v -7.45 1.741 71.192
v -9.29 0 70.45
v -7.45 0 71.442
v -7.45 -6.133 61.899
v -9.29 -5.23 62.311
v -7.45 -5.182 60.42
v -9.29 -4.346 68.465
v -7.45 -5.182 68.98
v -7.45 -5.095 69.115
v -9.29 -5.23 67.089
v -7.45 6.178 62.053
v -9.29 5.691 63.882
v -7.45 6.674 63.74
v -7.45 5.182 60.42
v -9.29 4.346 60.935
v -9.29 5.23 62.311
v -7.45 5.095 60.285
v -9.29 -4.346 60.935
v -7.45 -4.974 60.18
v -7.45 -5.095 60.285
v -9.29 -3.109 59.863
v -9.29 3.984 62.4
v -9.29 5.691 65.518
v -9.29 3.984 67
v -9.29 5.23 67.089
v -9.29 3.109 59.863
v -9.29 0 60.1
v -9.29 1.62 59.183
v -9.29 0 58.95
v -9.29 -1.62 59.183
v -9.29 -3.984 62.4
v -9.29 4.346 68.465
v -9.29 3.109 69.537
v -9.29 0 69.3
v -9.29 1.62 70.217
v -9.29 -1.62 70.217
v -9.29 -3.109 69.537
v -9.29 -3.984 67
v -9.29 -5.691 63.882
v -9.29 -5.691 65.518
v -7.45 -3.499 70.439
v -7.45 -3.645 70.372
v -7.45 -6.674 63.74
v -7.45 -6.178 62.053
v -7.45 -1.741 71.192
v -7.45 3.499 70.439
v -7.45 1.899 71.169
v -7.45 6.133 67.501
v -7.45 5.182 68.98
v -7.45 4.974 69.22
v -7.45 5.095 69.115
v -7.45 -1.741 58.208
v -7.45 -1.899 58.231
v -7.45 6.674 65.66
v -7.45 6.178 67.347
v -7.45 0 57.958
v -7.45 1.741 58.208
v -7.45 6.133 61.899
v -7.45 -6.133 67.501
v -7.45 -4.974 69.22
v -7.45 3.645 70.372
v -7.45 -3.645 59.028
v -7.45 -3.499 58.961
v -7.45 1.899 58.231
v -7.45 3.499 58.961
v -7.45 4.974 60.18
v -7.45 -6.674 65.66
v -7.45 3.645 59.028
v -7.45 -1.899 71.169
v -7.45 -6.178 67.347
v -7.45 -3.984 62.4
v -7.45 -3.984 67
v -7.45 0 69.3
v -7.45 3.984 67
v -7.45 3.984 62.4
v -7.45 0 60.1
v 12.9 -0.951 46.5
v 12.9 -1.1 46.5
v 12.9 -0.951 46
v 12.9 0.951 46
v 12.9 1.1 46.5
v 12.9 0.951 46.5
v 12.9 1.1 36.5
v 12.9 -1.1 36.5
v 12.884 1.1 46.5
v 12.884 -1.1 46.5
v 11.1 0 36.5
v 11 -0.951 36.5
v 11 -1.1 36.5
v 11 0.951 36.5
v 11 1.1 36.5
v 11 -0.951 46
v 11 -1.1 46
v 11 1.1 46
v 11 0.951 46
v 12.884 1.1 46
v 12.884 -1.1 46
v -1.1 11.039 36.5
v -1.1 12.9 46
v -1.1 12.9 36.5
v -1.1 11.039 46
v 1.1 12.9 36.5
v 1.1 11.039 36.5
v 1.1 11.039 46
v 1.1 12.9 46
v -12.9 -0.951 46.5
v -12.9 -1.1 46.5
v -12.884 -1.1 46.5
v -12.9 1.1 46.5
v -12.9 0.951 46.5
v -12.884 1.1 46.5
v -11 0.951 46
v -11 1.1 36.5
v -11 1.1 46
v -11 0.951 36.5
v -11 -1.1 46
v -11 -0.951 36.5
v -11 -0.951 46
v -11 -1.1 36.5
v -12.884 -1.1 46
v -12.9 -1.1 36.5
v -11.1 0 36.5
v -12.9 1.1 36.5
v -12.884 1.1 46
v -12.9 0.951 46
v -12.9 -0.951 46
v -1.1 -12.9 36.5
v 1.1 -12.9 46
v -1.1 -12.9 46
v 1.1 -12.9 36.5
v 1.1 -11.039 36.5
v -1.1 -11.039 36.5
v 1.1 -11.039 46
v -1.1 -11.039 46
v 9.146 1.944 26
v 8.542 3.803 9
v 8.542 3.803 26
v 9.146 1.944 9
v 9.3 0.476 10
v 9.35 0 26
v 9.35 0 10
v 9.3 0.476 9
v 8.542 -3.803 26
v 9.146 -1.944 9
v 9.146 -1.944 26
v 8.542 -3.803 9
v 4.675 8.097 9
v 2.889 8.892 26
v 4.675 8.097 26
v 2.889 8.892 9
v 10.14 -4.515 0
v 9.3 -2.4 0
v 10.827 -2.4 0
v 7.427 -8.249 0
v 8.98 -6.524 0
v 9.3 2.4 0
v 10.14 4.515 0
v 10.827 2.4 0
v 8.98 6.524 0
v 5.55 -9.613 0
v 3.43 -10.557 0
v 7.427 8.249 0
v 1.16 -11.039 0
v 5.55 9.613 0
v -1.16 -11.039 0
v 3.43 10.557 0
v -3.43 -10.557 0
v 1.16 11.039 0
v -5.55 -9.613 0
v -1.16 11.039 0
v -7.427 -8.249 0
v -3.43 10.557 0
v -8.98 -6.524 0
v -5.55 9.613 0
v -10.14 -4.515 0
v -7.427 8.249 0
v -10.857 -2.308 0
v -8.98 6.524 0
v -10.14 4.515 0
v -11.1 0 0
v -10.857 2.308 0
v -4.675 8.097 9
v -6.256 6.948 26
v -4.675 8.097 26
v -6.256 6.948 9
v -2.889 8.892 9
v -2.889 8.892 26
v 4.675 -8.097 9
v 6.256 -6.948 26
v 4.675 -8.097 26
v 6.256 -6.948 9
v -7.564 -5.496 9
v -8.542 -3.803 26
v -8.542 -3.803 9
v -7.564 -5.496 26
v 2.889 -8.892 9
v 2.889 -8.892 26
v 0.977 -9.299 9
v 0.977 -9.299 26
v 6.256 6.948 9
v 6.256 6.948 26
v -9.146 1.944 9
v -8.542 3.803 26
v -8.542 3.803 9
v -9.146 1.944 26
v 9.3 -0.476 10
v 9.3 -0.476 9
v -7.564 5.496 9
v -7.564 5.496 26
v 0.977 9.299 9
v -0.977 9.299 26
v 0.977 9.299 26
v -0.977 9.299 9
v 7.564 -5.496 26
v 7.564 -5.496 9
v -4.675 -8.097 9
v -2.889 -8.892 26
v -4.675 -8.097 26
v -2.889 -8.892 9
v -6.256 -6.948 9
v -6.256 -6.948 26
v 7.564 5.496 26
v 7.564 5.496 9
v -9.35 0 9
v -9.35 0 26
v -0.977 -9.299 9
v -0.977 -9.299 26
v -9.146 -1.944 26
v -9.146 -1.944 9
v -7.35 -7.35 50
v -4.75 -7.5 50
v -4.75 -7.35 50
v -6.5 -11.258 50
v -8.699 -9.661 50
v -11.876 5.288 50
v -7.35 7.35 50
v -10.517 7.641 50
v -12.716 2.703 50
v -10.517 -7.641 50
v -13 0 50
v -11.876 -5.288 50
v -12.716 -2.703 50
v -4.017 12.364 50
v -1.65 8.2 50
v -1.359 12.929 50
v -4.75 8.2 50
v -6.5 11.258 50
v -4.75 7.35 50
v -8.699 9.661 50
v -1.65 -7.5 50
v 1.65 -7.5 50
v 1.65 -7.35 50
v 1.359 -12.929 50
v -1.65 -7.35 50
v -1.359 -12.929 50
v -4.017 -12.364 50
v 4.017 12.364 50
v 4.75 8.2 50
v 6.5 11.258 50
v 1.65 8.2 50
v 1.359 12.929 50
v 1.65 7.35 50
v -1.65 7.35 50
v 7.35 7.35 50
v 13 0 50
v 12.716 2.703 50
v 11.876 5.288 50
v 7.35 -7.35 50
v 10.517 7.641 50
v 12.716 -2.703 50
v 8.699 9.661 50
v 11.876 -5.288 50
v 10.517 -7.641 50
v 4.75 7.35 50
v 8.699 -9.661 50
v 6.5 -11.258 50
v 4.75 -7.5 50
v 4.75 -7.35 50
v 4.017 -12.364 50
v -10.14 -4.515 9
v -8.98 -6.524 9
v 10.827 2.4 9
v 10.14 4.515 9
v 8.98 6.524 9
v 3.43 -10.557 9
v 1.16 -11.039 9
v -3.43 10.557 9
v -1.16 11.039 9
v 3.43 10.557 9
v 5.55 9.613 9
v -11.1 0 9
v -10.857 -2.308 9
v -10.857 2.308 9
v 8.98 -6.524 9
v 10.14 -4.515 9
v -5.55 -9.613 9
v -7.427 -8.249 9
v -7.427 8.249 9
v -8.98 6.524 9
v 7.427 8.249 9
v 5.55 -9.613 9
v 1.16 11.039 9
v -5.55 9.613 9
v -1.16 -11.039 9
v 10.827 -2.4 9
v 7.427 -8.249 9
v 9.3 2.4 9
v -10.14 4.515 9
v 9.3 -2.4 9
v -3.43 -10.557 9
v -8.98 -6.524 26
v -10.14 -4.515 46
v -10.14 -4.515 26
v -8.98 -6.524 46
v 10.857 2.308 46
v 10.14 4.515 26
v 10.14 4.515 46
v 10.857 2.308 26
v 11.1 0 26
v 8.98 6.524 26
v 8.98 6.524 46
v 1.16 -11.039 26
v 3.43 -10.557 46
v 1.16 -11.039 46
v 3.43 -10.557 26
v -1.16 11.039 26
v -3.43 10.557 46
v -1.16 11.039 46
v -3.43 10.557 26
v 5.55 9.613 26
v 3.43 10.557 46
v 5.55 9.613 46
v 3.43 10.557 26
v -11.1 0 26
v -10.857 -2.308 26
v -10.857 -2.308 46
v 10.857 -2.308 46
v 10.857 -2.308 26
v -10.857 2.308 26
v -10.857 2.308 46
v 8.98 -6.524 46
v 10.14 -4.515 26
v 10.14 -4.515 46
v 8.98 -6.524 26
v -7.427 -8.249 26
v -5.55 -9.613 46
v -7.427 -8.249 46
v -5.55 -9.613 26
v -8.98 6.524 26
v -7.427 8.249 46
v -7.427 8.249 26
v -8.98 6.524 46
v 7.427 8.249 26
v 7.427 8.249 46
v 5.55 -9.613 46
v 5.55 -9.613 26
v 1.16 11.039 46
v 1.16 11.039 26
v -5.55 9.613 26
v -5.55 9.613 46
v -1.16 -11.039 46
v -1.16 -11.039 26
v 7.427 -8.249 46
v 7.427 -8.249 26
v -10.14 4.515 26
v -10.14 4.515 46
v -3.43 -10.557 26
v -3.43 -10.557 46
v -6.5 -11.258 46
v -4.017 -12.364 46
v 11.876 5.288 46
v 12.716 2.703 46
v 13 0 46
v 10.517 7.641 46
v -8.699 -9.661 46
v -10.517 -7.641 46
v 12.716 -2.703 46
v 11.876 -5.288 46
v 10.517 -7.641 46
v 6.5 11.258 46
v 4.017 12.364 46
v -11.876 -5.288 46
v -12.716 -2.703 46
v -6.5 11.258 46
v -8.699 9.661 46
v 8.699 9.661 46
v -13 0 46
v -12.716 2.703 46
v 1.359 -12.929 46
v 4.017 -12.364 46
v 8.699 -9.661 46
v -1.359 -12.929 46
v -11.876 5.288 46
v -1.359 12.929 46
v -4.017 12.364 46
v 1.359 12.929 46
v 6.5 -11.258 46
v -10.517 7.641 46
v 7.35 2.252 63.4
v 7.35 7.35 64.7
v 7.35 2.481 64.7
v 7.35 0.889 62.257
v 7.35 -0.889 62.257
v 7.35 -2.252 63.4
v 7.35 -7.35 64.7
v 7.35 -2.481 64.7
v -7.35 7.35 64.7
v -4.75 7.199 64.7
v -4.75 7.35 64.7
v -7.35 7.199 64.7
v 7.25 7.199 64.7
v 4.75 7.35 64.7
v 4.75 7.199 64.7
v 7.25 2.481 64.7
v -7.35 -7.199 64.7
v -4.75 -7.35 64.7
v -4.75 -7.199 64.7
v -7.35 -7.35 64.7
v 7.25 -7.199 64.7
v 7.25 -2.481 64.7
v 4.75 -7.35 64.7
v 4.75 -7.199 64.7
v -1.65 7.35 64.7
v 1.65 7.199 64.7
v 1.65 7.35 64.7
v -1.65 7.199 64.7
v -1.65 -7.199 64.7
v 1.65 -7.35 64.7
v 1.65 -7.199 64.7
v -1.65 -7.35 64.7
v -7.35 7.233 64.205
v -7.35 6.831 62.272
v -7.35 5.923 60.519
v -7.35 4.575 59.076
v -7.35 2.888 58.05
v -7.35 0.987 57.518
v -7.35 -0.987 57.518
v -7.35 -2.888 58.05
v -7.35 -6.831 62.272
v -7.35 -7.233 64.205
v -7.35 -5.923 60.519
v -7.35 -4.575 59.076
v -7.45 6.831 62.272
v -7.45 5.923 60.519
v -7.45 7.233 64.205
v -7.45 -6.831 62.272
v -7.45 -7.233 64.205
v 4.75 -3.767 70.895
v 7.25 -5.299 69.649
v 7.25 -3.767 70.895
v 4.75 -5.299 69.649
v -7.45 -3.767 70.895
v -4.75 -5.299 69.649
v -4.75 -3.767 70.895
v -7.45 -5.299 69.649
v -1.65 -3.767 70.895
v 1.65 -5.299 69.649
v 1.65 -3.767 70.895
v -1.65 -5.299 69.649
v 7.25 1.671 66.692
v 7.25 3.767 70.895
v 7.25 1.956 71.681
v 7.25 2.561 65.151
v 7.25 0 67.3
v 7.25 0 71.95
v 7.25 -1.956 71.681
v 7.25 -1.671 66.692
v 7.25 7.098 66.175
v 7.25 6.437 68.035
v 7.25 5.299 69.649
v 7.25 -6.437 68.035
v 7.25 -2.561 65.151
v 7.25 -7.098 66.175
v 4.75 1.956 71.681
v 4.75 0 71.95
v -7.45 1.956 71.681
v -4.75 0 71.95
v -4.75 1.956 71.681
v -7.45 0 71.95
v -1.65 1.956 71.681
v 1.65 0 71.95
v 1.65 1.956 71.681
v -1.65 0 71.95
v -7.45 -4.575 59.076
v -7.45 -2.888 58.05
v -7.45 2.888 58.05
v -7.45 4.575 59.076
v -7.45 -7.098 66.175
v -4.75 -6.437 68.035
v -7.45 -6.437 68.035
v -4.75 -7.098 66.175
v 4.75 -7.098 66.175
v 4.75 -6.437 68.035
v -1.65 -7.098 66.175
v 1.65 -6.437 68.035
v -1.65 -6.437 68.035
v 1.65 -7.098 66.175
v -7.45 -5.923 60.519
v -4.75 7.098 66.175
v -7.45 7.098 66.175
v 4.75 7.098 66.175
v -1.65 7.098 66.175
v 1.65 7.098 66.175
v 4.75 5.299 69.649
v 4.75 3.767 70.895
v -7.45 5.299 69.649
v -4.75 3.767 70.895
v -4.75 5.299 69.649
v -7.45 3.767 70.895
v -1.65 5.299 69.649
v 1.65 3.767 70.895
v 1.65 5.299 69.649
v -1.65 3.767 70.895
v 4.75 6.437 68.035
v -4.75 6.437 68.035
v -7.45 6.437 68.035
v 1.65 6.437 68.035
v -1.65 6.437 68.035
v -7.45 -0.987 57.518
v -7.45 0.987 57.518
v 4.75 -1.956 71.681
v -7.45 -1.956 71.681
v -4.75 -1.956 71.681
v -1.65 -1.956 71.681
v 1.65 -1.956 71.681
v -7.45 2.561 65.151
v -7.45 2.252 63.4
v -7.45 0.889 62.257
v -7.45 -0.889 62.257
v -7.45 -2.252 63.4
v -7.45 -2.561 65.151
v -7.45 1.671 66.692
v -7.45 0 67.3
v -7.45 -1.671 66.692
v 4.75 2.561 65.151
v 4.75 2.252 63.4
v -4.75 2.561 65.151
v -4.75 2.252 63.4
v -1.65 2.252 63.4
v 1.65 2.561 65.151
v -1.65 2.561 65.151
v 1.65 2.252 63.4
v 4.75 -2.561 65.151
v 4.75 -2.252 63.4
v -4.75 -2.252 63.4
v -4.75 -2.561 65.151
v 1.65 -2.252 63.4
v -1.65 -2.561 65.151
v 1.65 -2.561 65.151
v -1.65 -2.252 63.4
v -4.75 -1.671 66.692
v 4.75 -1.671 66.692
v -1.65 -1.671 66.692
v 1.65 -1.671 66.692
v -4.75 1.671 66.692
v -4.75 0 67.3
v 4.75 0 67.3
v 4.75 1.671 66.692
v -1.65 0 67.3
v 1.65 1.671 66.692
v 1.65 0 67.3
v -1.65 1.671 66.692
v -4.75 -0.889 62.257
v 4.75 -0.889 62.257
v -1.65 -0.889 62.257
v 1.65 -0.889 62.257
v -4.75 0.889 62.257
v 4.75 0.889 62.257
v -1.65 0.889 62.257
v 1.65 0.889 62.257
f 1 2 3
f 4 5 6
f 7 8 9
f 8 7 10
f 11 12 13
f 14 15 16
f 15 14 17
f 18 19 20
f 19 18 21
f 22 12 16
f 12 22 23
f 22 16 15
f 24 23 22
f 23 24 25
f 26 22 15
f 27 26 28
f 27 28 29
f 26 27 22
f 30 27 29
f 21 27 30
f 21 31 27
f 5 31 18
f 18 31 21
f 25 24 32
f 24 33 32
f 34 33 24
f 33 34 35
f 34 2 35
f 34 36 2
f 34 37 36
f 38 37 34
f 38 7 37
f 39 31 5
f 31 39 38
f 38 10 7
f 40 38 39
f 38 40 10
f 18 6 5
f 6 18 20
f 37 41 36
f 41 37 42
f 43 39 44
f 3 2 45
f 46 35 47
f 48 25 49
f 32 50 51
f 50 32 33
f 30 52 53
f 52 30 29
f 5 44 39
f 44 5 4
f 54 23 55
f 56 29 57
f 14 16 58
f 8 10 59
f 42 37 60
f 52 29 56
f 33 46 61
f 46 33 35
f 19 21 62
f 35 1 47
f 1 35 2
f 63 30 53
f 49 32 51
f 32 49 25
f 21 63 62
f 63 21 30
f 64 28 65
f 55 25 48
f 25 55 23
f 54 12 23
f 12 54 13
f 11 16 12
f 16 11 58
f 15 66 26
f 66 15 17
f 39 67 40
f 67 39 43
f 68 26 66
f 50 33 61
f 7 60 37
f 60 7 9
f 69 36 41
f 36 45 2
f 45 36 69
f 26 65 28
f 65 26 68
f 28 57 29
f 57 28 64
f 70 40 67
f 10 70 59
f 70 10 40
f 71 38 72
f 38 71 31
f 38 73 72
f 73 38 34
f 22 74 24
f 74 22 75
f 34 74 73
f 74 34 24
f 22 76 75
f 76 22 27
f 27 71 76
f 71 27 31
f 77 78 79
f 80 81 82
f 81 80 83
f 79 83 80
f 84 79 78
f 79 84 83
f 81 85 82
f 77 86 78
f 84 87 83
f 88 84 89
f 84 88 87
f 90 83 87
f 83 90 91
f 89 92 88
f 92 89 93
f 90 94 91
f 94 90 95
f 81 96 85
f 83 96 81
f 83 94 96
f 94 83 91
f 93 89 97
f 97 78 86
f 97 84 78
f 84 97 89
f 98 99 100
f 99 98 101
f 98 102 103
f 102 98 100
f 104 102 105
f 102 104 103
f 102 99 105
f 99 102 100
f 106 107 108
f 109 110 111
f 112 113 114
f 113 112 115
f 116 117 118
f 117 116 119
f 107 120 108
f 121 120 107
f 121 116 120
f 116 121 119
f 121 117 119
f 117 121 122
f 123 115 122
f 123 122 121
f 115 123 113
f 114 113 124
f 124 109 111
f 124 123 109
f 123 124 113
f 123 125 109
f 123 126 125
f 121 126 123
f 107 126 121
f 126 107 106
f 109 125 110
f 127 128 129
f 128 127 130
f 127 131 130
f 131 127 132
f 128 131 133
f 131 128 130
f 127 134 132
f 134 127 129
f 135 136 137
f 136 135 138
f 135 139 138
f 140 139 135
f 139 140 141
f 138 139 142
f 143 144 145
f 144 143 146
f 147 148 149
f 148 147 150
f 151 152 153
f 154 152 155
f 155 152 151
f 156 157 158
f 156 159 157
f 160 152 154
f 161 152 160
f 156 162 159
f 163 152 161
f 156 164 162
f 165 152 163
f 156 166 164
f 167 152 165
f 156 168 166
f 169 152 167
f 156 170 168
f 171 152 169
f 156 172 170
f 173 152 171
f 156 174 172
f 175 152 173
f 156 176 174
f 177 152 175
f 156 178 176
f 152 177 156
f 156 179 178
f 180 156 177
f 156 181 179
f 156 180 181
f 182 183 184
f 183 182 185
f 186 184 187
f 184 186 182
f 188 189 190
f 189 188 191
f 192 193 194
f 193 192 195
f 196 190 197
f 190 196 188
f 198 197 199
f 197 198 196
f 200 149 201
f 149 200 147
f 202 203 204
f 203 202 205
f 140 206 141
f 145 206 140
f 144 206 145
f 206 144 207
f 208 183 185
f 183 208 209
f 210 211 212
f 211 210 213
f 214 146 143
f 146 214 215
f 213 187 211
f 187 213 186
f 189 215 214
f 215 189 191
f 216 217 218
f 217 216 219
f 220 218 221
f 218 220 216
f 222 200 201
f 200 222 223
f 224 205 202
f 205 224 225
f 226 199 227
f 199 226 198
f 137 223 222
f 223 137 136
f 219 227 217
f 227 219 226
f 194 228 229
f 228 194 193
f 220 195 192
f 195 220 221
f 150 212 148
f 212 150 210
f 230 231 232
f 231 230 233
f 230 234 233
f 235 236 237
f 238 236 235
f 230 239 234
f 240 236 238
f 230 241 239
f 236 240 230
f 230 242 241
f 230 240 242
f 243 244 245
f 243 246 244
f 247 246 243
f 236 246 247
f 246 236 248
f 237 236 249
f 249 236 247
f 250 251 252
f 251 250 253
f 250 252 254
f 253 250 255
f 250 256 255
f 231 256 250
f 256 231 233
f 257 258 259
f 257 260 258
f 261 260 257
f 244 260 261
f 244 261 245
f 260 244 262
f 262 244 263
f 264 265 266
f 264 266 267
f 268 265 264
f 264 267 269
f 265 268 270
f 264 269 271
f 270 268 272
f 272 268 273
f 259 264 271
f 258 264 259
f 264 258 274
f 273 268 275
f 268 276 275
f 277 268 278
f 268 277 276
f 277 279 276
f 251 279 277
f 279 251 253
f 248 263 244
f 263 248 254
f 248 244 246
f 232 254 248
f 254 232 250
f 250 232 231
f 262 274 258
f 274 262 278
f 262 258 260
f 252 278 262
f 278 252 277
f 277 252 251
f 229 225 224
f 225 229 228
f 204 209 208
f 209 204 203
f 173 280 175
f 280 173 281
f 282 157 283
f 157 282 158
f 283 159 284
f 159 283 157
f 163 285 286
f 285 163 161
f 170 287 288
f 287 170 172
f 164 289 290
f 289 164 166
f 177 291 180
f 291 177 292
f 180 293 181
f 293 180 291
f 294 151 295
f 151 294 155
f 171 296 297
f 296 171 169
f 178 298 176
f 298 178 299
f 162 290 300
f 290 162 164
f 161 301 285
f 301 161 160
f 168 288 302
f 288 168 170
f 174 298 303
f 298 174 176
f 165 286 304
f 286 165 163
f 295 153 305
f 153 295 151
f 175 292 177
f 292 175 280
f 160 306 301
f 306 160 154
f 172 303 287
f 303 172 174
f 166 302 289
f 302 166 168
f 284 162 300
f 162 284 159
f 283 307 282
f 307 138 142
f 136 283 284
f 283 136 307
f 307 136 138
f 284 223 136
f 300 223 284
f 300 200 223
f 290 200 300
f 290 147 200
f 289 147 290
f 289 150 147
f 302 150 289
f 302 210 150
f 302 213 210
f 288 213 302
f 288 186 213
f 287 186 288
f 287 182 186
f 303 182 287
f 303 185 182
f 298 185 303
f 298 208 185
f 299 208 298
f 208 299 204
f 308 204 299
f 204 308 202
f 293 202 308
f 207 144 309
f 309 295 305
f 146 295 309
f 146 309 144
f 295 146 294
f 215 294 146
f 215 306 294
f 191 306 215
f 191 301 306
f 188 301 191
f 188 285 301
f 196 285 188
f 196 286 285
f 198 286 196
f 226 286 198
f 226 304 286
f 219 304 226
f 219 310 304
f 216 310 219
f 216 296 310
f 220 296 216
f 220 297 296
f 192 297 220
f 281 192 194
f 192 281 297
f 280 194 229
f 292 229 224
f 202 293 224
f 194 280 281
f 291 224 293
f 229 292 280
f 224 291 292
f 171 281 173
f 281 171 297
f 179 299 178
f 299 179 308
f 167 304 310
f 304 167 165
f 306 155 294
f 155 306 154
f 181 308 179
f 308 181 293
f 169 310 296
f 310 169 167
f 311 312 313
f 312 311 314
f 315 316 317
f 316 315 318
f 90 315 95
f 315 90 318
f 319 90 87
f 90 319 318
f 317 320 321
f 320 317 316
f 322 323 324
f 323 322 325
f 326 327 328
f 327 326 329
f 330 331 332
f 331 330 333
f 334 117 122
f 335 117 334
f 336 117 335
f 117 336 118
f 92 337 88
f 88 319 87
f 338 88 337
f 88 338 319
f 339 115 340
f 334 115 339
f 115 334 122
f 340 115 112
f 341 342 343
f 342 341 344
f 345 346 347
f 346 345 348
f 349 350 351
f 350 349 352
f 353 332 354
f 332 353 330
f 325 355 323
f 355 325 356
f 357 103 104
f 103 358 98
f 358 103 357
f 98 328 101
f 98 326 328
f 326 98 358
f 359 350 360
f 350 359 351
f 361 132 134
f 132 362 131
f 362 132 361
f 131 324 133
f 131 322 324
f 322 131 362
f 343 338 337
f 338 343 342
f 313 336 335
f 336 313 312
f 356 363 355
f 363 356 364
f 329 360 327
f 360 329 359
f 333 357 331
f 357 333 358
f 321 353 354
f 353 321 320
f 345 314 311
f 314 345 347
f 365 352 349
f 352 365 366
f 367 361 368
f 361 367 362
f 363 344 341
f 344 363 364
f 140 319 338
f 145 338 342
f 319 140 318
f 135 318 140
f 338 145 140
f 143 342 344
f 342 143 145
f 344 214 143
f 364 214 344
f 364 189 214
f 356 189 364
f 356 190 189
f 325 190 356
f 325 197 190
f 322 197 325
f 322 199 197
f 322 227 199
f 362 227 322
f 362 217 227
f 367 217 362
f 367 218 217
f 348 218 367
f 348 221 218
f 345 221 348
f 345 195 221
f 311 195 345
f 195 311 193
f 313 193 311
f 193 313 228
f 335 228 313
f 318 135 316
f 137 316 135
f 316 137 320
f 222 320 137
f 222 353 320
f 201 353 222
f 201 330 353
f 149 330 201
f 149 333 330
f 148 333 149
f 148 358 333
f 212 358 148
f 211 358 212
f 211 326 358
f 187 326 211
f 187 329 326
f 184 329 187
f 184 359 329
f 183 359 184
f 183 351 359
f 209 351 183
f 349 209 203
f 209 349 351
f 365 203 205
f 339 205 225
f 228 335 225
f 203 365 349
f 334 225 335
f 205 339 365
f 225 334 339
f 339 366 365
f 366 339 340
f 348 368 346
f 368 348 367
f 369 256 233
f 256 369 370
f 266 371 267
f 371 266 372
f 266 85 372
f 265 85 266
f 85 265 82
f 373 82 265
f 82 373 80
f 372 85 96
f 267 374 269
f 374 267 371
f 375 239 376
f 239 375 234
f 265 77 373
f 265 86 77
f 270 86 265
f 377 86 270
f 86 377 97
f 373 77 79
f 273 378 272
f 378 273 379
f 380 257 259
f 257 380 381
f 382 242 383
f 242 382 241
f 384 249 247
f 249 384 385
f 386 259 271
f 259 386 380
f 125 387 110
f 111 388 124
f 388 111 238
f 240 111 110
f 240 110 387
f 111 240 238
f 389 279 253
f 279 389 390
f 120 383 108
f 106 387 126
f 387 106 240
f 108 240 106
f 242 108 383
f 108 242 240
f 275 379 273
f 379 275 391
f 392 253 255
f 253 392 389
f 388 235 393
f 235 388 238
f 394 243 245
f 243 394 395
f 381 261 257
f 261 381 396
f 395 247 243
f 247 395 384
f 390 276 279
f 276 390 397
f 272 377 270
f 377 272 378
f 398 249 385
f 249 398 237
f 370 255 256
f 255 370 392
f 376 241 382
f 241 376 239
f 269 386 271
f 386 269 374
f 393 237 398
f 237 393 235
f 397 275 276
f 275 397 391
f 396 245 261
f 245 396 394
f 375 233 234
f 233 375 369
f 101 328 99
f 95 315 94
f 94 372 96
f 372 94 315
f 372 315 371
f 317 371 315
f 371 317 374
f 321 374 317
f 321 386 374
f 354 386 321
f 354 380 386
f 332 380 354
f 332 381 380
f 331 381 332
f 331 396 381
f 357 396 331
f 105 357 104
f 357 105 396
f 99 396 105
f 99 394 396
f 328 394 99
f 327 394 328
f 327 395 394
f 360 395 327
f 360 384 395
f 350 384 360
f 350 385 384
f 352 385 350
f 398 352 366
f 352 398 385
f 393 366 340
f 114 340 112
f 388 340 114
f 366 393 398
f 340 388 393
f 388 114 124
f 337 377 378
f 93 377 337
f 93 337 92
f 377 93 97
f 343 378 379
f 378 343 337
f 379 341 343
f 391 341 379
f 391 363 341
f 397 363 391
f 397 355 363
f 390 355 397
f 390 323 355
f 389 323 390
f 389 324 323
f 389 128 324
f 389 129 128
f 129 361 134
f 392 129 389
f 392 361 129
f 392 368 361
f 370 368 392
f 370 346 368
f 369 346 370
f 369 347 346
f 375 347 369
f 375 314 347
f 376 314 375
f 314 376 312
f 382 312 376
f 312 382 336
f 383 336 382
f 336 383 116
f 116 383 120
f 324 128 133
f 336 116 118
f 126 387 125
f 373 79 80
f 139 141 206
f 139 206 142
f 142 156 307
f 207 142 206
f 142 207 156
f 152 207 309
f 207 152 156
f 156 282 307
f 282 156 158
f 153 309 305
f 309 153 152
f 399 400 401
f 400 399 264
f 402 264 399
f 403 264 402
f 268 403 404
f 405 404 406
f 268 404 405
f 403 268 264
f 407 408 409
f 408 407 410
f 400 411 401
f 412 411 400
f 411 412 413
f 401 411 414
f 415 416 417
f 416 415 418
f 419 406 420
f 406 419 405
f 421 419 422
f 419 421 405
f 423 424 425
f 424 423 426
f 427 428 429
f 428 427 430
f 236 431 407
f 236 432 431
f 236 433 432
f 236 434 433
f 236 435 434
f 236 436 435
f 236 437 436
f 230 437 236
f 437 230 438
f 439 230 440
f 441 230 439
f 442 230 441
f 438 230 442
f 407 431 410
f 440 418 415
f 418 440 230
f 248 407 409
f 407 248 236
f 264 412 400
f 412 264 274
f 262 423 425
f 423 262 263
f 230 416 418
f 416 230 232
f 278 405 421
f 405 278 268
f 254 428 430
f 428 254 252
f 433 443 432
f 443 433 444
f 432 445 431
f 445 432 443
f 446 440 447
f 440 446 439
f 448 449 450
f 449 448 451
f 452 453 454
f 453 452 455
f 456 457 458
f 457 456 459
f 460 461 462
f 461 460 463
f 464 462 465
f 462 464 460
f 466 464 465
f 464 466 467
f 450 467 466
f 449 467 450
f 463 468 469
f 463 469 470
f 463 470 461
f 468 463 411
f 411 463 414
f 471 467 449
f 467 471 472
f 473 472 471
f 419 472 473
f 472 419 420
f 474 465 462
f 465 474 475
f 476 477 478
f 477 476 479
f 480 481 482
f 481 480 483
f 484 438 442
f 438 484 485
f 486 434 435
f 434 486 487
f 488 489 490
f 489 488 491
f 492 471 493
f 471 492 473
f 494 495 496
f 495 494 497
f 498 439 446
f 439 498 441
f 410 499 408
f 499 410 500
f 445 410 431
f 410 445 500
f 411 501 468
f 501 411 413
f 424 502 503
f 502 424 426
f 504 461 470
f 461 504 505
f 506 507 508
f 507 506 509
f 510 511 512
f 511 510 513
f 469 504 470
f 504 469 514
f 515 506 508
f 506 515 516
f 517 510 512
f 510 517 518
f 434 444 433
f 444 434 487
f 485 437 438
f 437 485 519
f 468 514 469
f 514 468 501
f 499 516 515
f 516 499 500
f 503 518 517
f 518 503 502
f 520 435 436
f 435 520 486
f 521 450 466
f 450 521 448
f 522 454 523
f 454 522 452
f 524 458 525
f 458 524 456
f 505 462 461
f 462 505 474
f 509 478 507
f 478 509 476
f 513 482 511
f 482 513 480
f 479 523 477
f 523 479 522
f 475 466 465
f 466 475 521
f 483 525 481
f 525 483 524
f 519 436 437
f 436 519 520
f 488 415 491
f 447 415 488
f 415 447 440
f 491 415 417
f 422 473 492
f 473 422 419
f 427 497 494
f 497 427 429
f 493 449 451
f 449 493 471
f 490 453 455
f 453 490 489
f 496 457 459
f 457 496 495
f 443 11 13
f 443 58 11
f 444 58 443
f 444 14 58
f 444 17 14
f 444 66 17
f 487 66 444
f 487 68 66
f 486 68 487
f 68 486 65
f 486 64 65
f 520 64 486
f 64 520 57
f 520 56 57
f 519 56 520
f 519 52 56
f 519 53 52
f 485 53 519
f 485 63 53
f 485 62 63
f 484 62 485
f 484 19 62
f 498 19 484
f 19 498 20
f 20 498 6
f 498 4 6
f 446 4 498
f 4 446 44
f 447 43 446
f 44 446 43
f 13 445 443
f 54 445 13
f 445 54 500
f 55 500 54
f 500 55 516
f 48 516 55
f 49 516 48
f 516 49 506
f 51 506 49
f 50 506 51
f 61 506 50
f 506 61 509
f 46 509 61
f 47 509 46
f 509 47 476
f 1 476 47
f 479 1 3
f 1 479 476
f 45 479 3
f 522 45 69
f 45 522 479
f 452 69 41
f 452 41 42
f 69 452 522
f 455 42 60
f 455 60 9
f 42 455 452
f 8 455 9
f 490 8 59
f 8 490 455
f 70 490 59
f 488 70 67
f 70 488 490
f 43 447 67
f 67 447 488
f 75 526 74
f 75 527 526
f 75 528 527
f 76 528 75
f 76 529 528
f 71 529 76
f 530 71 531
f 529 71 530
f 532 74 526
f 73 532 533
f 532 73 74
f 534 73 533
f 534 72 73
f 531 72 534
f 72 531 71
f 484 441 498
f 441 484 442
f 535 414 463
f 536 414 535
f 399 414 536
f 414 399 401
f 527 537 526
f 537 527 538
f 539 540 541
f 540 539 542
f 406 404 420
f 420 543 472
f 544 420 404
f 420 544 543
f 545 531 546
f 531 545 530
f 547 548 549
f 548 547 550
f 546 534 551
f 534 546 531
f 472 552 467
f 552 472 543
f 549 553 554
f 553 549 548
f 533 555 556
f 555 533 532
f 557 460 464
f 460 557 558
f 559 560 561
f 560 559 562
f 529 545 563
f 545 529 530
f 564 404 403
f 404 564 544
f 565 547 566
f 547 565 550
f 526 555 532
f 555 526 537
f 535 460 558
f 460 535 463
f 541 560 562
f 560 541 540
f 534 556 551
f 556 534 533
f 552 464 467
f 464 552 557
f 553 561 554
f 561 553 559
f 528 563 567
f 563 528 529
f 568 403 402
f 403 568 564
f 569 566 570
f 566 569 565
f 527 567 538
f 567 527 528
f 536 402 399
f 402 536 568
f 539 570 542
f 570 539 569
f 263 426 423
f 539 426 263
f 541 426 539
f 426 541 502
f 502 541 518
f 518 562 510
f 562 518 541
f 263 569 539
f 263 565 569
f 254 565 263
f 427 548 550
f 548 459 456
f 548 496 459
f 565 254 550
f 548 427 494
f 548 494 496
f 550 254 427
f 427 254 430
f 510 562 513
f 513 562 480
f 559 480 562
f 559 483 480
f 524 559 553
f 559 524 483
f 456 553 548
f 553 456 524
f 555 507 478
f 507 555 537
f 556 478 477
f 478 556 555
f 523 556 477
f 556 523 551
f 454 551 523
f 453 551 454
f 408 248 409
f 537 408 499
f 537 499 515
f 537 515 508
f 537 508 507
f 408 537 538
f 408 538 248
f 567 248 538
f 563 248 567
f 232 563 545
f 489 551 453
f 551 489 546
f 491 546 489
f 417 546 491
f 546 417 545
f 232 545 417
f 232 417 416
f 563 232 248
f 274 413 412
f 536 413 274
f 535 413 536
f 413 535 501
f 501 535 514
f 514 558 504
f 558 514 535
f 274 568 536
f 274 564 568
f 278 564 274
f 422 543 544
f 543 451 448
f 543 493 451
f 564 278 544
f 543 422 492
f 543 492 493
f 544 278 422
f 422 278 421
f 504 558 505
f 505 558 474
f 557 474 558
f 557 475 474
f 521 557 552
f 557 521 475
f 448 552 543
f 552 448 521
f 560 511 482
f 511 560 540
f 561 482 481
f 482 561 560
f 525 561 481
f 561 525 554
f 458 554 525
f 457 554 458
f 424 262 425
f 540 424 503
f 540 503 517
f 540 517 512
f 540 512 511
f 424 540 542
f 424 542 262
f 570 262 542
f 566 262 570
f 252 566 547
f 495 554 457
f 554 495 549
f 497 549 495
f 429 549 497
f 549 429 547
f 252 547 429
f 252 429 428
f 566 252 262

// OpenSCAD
/*
 * Go Pro mount for Cabela's ( Scotty's ) fishing pole holder
 * CCv3 SA BY 
 * by Angus Ainslie May 9 2017
 *
 * Much thanks goes to additional code work the following:
 *
 * GoPro variables from MoonCactus
*/


// Go Pro Parameters
/* [Rod and captive nut] */

gopro_rod_nut_od= 8.05;
// How much is the protruding output of the rod on the rod attachment (can be zero), useful if you don't want a captive nut with still a tight coupling
gopro_captive_protruding_h= 0.5;
// The gopro connector itself (you most probably do not want to change this but for the first two)

// The locking nut on the gopro mount triple arm mount (keep it tight)
gopro_nut_d= 9.2;
// How deep is this nut embossing (keep it small to avoid over-overhangs)
gopro_nut_h= 2;
// Hole diameter for the two-arm mount part
gopro_holed_two= 5;
// Hole diameter for the three-arm mount part
gopro_holed_three= 5.5;
// Thickness of the internal arm in the 3-arm mount part
gopro_connector_th3_middle= 3.1;
// Thickness of the side arms in the 3-arm mount part
gopro_connector_th3_side= 2.7;
// Thickness of the arms in the 2-arm mount part
gopro_connector_th2= 3.04;
// The gap in the 3-arm mount part for the two-arm
gopro_connector_gap= 3.1;
// How round are the 2 and 3-arm parts
gopro_connector_roundness= 1;
// How thick are the mount walls
gopro_wall_th= 3;

gopro_connector_wall_tol=0.5+0;
gopro_tol=0.04+0;

gopro_connector_z= 2*gopro_connector_th3_side+gopro_connector_th3_middle+2*gopro_connector_gap;
gopro_connector_x= gopro_connector_z;
gopro_connector_y= gopro_connector_z/2+gopro_wall_th;



gopro =true;



difference(){
union(){

//add a GoPro style mount?
			// add the base wall
			translate([-(gopro_connector_x/2),-(gopro_connector_z/2),50])	
				cube([gopro_connector_x,gopro_connector_z,gopro_connector_z]);


			// add the rounded top
			translate([7.25,0,gopro_connector_z+50])
				rotate([0,-90,0])
					cylinder(r=7.25, h=gopro_connector_z);

			// add the optional nut emboss
			rotate([0,0,0])
			translate([-7.25,0,gopro_connector_z+50])
				rotate([0,-90,0])
				difference()
				{
  				cylinder(r1=gopro_connector_z/2-gopro_connector_roundness/2, r2=11.5/2, h=gopro_nut_h+gopro_tol);
				cylinder(r=gopro_nut_d/2, h=gopro_connector_z/2+3.5+gopro_tol, $fn=6);
				}


	difference()
	{
        union() {
            cylinder (d=18.7,h=50);
            cylinder (d=22.2,h=9);
            translate( [ 0,0,26 ]) cylinder (d=22.2,h=22);
            translate( [ 0,0,46 ]) cylinder (d=26,h=4);
            for (i=[0:360/4:360])
                rotate( [0,0,i] ) translate( [11, -1.1, 36.5 ] ) cube( [1.9, 2.2, 10 ] );
        }
        union() {

            translate( [9.3, -2.4, 0 ] ) cube( [3, 4.8, 10 ] );
        }
//		english_thread(7/8, 5, 1, internal=true);
	}


}//end the union of the base shapes & start removing

			//GoPro Screw Hole
			translate([8,0,gopro_connector_z+50])
				rotate([0,-90,0])
					cylinder(r=2.6, h=gopro_connector_z+2);

			//GoPro Mount Slots
			translate([-((gopro_connector_x/2)-2.6),-7.5,50])	
				cube([3.1, gopro_connector_x+1,gopro_connector_z*2]);

			translate([-((gopro_connector_x/2)-2.6)+3.1+3.3,-7.5,50])	
				cube([3.1, gopro_connector_x+1,gopro_connector_z*2]);
	

}
